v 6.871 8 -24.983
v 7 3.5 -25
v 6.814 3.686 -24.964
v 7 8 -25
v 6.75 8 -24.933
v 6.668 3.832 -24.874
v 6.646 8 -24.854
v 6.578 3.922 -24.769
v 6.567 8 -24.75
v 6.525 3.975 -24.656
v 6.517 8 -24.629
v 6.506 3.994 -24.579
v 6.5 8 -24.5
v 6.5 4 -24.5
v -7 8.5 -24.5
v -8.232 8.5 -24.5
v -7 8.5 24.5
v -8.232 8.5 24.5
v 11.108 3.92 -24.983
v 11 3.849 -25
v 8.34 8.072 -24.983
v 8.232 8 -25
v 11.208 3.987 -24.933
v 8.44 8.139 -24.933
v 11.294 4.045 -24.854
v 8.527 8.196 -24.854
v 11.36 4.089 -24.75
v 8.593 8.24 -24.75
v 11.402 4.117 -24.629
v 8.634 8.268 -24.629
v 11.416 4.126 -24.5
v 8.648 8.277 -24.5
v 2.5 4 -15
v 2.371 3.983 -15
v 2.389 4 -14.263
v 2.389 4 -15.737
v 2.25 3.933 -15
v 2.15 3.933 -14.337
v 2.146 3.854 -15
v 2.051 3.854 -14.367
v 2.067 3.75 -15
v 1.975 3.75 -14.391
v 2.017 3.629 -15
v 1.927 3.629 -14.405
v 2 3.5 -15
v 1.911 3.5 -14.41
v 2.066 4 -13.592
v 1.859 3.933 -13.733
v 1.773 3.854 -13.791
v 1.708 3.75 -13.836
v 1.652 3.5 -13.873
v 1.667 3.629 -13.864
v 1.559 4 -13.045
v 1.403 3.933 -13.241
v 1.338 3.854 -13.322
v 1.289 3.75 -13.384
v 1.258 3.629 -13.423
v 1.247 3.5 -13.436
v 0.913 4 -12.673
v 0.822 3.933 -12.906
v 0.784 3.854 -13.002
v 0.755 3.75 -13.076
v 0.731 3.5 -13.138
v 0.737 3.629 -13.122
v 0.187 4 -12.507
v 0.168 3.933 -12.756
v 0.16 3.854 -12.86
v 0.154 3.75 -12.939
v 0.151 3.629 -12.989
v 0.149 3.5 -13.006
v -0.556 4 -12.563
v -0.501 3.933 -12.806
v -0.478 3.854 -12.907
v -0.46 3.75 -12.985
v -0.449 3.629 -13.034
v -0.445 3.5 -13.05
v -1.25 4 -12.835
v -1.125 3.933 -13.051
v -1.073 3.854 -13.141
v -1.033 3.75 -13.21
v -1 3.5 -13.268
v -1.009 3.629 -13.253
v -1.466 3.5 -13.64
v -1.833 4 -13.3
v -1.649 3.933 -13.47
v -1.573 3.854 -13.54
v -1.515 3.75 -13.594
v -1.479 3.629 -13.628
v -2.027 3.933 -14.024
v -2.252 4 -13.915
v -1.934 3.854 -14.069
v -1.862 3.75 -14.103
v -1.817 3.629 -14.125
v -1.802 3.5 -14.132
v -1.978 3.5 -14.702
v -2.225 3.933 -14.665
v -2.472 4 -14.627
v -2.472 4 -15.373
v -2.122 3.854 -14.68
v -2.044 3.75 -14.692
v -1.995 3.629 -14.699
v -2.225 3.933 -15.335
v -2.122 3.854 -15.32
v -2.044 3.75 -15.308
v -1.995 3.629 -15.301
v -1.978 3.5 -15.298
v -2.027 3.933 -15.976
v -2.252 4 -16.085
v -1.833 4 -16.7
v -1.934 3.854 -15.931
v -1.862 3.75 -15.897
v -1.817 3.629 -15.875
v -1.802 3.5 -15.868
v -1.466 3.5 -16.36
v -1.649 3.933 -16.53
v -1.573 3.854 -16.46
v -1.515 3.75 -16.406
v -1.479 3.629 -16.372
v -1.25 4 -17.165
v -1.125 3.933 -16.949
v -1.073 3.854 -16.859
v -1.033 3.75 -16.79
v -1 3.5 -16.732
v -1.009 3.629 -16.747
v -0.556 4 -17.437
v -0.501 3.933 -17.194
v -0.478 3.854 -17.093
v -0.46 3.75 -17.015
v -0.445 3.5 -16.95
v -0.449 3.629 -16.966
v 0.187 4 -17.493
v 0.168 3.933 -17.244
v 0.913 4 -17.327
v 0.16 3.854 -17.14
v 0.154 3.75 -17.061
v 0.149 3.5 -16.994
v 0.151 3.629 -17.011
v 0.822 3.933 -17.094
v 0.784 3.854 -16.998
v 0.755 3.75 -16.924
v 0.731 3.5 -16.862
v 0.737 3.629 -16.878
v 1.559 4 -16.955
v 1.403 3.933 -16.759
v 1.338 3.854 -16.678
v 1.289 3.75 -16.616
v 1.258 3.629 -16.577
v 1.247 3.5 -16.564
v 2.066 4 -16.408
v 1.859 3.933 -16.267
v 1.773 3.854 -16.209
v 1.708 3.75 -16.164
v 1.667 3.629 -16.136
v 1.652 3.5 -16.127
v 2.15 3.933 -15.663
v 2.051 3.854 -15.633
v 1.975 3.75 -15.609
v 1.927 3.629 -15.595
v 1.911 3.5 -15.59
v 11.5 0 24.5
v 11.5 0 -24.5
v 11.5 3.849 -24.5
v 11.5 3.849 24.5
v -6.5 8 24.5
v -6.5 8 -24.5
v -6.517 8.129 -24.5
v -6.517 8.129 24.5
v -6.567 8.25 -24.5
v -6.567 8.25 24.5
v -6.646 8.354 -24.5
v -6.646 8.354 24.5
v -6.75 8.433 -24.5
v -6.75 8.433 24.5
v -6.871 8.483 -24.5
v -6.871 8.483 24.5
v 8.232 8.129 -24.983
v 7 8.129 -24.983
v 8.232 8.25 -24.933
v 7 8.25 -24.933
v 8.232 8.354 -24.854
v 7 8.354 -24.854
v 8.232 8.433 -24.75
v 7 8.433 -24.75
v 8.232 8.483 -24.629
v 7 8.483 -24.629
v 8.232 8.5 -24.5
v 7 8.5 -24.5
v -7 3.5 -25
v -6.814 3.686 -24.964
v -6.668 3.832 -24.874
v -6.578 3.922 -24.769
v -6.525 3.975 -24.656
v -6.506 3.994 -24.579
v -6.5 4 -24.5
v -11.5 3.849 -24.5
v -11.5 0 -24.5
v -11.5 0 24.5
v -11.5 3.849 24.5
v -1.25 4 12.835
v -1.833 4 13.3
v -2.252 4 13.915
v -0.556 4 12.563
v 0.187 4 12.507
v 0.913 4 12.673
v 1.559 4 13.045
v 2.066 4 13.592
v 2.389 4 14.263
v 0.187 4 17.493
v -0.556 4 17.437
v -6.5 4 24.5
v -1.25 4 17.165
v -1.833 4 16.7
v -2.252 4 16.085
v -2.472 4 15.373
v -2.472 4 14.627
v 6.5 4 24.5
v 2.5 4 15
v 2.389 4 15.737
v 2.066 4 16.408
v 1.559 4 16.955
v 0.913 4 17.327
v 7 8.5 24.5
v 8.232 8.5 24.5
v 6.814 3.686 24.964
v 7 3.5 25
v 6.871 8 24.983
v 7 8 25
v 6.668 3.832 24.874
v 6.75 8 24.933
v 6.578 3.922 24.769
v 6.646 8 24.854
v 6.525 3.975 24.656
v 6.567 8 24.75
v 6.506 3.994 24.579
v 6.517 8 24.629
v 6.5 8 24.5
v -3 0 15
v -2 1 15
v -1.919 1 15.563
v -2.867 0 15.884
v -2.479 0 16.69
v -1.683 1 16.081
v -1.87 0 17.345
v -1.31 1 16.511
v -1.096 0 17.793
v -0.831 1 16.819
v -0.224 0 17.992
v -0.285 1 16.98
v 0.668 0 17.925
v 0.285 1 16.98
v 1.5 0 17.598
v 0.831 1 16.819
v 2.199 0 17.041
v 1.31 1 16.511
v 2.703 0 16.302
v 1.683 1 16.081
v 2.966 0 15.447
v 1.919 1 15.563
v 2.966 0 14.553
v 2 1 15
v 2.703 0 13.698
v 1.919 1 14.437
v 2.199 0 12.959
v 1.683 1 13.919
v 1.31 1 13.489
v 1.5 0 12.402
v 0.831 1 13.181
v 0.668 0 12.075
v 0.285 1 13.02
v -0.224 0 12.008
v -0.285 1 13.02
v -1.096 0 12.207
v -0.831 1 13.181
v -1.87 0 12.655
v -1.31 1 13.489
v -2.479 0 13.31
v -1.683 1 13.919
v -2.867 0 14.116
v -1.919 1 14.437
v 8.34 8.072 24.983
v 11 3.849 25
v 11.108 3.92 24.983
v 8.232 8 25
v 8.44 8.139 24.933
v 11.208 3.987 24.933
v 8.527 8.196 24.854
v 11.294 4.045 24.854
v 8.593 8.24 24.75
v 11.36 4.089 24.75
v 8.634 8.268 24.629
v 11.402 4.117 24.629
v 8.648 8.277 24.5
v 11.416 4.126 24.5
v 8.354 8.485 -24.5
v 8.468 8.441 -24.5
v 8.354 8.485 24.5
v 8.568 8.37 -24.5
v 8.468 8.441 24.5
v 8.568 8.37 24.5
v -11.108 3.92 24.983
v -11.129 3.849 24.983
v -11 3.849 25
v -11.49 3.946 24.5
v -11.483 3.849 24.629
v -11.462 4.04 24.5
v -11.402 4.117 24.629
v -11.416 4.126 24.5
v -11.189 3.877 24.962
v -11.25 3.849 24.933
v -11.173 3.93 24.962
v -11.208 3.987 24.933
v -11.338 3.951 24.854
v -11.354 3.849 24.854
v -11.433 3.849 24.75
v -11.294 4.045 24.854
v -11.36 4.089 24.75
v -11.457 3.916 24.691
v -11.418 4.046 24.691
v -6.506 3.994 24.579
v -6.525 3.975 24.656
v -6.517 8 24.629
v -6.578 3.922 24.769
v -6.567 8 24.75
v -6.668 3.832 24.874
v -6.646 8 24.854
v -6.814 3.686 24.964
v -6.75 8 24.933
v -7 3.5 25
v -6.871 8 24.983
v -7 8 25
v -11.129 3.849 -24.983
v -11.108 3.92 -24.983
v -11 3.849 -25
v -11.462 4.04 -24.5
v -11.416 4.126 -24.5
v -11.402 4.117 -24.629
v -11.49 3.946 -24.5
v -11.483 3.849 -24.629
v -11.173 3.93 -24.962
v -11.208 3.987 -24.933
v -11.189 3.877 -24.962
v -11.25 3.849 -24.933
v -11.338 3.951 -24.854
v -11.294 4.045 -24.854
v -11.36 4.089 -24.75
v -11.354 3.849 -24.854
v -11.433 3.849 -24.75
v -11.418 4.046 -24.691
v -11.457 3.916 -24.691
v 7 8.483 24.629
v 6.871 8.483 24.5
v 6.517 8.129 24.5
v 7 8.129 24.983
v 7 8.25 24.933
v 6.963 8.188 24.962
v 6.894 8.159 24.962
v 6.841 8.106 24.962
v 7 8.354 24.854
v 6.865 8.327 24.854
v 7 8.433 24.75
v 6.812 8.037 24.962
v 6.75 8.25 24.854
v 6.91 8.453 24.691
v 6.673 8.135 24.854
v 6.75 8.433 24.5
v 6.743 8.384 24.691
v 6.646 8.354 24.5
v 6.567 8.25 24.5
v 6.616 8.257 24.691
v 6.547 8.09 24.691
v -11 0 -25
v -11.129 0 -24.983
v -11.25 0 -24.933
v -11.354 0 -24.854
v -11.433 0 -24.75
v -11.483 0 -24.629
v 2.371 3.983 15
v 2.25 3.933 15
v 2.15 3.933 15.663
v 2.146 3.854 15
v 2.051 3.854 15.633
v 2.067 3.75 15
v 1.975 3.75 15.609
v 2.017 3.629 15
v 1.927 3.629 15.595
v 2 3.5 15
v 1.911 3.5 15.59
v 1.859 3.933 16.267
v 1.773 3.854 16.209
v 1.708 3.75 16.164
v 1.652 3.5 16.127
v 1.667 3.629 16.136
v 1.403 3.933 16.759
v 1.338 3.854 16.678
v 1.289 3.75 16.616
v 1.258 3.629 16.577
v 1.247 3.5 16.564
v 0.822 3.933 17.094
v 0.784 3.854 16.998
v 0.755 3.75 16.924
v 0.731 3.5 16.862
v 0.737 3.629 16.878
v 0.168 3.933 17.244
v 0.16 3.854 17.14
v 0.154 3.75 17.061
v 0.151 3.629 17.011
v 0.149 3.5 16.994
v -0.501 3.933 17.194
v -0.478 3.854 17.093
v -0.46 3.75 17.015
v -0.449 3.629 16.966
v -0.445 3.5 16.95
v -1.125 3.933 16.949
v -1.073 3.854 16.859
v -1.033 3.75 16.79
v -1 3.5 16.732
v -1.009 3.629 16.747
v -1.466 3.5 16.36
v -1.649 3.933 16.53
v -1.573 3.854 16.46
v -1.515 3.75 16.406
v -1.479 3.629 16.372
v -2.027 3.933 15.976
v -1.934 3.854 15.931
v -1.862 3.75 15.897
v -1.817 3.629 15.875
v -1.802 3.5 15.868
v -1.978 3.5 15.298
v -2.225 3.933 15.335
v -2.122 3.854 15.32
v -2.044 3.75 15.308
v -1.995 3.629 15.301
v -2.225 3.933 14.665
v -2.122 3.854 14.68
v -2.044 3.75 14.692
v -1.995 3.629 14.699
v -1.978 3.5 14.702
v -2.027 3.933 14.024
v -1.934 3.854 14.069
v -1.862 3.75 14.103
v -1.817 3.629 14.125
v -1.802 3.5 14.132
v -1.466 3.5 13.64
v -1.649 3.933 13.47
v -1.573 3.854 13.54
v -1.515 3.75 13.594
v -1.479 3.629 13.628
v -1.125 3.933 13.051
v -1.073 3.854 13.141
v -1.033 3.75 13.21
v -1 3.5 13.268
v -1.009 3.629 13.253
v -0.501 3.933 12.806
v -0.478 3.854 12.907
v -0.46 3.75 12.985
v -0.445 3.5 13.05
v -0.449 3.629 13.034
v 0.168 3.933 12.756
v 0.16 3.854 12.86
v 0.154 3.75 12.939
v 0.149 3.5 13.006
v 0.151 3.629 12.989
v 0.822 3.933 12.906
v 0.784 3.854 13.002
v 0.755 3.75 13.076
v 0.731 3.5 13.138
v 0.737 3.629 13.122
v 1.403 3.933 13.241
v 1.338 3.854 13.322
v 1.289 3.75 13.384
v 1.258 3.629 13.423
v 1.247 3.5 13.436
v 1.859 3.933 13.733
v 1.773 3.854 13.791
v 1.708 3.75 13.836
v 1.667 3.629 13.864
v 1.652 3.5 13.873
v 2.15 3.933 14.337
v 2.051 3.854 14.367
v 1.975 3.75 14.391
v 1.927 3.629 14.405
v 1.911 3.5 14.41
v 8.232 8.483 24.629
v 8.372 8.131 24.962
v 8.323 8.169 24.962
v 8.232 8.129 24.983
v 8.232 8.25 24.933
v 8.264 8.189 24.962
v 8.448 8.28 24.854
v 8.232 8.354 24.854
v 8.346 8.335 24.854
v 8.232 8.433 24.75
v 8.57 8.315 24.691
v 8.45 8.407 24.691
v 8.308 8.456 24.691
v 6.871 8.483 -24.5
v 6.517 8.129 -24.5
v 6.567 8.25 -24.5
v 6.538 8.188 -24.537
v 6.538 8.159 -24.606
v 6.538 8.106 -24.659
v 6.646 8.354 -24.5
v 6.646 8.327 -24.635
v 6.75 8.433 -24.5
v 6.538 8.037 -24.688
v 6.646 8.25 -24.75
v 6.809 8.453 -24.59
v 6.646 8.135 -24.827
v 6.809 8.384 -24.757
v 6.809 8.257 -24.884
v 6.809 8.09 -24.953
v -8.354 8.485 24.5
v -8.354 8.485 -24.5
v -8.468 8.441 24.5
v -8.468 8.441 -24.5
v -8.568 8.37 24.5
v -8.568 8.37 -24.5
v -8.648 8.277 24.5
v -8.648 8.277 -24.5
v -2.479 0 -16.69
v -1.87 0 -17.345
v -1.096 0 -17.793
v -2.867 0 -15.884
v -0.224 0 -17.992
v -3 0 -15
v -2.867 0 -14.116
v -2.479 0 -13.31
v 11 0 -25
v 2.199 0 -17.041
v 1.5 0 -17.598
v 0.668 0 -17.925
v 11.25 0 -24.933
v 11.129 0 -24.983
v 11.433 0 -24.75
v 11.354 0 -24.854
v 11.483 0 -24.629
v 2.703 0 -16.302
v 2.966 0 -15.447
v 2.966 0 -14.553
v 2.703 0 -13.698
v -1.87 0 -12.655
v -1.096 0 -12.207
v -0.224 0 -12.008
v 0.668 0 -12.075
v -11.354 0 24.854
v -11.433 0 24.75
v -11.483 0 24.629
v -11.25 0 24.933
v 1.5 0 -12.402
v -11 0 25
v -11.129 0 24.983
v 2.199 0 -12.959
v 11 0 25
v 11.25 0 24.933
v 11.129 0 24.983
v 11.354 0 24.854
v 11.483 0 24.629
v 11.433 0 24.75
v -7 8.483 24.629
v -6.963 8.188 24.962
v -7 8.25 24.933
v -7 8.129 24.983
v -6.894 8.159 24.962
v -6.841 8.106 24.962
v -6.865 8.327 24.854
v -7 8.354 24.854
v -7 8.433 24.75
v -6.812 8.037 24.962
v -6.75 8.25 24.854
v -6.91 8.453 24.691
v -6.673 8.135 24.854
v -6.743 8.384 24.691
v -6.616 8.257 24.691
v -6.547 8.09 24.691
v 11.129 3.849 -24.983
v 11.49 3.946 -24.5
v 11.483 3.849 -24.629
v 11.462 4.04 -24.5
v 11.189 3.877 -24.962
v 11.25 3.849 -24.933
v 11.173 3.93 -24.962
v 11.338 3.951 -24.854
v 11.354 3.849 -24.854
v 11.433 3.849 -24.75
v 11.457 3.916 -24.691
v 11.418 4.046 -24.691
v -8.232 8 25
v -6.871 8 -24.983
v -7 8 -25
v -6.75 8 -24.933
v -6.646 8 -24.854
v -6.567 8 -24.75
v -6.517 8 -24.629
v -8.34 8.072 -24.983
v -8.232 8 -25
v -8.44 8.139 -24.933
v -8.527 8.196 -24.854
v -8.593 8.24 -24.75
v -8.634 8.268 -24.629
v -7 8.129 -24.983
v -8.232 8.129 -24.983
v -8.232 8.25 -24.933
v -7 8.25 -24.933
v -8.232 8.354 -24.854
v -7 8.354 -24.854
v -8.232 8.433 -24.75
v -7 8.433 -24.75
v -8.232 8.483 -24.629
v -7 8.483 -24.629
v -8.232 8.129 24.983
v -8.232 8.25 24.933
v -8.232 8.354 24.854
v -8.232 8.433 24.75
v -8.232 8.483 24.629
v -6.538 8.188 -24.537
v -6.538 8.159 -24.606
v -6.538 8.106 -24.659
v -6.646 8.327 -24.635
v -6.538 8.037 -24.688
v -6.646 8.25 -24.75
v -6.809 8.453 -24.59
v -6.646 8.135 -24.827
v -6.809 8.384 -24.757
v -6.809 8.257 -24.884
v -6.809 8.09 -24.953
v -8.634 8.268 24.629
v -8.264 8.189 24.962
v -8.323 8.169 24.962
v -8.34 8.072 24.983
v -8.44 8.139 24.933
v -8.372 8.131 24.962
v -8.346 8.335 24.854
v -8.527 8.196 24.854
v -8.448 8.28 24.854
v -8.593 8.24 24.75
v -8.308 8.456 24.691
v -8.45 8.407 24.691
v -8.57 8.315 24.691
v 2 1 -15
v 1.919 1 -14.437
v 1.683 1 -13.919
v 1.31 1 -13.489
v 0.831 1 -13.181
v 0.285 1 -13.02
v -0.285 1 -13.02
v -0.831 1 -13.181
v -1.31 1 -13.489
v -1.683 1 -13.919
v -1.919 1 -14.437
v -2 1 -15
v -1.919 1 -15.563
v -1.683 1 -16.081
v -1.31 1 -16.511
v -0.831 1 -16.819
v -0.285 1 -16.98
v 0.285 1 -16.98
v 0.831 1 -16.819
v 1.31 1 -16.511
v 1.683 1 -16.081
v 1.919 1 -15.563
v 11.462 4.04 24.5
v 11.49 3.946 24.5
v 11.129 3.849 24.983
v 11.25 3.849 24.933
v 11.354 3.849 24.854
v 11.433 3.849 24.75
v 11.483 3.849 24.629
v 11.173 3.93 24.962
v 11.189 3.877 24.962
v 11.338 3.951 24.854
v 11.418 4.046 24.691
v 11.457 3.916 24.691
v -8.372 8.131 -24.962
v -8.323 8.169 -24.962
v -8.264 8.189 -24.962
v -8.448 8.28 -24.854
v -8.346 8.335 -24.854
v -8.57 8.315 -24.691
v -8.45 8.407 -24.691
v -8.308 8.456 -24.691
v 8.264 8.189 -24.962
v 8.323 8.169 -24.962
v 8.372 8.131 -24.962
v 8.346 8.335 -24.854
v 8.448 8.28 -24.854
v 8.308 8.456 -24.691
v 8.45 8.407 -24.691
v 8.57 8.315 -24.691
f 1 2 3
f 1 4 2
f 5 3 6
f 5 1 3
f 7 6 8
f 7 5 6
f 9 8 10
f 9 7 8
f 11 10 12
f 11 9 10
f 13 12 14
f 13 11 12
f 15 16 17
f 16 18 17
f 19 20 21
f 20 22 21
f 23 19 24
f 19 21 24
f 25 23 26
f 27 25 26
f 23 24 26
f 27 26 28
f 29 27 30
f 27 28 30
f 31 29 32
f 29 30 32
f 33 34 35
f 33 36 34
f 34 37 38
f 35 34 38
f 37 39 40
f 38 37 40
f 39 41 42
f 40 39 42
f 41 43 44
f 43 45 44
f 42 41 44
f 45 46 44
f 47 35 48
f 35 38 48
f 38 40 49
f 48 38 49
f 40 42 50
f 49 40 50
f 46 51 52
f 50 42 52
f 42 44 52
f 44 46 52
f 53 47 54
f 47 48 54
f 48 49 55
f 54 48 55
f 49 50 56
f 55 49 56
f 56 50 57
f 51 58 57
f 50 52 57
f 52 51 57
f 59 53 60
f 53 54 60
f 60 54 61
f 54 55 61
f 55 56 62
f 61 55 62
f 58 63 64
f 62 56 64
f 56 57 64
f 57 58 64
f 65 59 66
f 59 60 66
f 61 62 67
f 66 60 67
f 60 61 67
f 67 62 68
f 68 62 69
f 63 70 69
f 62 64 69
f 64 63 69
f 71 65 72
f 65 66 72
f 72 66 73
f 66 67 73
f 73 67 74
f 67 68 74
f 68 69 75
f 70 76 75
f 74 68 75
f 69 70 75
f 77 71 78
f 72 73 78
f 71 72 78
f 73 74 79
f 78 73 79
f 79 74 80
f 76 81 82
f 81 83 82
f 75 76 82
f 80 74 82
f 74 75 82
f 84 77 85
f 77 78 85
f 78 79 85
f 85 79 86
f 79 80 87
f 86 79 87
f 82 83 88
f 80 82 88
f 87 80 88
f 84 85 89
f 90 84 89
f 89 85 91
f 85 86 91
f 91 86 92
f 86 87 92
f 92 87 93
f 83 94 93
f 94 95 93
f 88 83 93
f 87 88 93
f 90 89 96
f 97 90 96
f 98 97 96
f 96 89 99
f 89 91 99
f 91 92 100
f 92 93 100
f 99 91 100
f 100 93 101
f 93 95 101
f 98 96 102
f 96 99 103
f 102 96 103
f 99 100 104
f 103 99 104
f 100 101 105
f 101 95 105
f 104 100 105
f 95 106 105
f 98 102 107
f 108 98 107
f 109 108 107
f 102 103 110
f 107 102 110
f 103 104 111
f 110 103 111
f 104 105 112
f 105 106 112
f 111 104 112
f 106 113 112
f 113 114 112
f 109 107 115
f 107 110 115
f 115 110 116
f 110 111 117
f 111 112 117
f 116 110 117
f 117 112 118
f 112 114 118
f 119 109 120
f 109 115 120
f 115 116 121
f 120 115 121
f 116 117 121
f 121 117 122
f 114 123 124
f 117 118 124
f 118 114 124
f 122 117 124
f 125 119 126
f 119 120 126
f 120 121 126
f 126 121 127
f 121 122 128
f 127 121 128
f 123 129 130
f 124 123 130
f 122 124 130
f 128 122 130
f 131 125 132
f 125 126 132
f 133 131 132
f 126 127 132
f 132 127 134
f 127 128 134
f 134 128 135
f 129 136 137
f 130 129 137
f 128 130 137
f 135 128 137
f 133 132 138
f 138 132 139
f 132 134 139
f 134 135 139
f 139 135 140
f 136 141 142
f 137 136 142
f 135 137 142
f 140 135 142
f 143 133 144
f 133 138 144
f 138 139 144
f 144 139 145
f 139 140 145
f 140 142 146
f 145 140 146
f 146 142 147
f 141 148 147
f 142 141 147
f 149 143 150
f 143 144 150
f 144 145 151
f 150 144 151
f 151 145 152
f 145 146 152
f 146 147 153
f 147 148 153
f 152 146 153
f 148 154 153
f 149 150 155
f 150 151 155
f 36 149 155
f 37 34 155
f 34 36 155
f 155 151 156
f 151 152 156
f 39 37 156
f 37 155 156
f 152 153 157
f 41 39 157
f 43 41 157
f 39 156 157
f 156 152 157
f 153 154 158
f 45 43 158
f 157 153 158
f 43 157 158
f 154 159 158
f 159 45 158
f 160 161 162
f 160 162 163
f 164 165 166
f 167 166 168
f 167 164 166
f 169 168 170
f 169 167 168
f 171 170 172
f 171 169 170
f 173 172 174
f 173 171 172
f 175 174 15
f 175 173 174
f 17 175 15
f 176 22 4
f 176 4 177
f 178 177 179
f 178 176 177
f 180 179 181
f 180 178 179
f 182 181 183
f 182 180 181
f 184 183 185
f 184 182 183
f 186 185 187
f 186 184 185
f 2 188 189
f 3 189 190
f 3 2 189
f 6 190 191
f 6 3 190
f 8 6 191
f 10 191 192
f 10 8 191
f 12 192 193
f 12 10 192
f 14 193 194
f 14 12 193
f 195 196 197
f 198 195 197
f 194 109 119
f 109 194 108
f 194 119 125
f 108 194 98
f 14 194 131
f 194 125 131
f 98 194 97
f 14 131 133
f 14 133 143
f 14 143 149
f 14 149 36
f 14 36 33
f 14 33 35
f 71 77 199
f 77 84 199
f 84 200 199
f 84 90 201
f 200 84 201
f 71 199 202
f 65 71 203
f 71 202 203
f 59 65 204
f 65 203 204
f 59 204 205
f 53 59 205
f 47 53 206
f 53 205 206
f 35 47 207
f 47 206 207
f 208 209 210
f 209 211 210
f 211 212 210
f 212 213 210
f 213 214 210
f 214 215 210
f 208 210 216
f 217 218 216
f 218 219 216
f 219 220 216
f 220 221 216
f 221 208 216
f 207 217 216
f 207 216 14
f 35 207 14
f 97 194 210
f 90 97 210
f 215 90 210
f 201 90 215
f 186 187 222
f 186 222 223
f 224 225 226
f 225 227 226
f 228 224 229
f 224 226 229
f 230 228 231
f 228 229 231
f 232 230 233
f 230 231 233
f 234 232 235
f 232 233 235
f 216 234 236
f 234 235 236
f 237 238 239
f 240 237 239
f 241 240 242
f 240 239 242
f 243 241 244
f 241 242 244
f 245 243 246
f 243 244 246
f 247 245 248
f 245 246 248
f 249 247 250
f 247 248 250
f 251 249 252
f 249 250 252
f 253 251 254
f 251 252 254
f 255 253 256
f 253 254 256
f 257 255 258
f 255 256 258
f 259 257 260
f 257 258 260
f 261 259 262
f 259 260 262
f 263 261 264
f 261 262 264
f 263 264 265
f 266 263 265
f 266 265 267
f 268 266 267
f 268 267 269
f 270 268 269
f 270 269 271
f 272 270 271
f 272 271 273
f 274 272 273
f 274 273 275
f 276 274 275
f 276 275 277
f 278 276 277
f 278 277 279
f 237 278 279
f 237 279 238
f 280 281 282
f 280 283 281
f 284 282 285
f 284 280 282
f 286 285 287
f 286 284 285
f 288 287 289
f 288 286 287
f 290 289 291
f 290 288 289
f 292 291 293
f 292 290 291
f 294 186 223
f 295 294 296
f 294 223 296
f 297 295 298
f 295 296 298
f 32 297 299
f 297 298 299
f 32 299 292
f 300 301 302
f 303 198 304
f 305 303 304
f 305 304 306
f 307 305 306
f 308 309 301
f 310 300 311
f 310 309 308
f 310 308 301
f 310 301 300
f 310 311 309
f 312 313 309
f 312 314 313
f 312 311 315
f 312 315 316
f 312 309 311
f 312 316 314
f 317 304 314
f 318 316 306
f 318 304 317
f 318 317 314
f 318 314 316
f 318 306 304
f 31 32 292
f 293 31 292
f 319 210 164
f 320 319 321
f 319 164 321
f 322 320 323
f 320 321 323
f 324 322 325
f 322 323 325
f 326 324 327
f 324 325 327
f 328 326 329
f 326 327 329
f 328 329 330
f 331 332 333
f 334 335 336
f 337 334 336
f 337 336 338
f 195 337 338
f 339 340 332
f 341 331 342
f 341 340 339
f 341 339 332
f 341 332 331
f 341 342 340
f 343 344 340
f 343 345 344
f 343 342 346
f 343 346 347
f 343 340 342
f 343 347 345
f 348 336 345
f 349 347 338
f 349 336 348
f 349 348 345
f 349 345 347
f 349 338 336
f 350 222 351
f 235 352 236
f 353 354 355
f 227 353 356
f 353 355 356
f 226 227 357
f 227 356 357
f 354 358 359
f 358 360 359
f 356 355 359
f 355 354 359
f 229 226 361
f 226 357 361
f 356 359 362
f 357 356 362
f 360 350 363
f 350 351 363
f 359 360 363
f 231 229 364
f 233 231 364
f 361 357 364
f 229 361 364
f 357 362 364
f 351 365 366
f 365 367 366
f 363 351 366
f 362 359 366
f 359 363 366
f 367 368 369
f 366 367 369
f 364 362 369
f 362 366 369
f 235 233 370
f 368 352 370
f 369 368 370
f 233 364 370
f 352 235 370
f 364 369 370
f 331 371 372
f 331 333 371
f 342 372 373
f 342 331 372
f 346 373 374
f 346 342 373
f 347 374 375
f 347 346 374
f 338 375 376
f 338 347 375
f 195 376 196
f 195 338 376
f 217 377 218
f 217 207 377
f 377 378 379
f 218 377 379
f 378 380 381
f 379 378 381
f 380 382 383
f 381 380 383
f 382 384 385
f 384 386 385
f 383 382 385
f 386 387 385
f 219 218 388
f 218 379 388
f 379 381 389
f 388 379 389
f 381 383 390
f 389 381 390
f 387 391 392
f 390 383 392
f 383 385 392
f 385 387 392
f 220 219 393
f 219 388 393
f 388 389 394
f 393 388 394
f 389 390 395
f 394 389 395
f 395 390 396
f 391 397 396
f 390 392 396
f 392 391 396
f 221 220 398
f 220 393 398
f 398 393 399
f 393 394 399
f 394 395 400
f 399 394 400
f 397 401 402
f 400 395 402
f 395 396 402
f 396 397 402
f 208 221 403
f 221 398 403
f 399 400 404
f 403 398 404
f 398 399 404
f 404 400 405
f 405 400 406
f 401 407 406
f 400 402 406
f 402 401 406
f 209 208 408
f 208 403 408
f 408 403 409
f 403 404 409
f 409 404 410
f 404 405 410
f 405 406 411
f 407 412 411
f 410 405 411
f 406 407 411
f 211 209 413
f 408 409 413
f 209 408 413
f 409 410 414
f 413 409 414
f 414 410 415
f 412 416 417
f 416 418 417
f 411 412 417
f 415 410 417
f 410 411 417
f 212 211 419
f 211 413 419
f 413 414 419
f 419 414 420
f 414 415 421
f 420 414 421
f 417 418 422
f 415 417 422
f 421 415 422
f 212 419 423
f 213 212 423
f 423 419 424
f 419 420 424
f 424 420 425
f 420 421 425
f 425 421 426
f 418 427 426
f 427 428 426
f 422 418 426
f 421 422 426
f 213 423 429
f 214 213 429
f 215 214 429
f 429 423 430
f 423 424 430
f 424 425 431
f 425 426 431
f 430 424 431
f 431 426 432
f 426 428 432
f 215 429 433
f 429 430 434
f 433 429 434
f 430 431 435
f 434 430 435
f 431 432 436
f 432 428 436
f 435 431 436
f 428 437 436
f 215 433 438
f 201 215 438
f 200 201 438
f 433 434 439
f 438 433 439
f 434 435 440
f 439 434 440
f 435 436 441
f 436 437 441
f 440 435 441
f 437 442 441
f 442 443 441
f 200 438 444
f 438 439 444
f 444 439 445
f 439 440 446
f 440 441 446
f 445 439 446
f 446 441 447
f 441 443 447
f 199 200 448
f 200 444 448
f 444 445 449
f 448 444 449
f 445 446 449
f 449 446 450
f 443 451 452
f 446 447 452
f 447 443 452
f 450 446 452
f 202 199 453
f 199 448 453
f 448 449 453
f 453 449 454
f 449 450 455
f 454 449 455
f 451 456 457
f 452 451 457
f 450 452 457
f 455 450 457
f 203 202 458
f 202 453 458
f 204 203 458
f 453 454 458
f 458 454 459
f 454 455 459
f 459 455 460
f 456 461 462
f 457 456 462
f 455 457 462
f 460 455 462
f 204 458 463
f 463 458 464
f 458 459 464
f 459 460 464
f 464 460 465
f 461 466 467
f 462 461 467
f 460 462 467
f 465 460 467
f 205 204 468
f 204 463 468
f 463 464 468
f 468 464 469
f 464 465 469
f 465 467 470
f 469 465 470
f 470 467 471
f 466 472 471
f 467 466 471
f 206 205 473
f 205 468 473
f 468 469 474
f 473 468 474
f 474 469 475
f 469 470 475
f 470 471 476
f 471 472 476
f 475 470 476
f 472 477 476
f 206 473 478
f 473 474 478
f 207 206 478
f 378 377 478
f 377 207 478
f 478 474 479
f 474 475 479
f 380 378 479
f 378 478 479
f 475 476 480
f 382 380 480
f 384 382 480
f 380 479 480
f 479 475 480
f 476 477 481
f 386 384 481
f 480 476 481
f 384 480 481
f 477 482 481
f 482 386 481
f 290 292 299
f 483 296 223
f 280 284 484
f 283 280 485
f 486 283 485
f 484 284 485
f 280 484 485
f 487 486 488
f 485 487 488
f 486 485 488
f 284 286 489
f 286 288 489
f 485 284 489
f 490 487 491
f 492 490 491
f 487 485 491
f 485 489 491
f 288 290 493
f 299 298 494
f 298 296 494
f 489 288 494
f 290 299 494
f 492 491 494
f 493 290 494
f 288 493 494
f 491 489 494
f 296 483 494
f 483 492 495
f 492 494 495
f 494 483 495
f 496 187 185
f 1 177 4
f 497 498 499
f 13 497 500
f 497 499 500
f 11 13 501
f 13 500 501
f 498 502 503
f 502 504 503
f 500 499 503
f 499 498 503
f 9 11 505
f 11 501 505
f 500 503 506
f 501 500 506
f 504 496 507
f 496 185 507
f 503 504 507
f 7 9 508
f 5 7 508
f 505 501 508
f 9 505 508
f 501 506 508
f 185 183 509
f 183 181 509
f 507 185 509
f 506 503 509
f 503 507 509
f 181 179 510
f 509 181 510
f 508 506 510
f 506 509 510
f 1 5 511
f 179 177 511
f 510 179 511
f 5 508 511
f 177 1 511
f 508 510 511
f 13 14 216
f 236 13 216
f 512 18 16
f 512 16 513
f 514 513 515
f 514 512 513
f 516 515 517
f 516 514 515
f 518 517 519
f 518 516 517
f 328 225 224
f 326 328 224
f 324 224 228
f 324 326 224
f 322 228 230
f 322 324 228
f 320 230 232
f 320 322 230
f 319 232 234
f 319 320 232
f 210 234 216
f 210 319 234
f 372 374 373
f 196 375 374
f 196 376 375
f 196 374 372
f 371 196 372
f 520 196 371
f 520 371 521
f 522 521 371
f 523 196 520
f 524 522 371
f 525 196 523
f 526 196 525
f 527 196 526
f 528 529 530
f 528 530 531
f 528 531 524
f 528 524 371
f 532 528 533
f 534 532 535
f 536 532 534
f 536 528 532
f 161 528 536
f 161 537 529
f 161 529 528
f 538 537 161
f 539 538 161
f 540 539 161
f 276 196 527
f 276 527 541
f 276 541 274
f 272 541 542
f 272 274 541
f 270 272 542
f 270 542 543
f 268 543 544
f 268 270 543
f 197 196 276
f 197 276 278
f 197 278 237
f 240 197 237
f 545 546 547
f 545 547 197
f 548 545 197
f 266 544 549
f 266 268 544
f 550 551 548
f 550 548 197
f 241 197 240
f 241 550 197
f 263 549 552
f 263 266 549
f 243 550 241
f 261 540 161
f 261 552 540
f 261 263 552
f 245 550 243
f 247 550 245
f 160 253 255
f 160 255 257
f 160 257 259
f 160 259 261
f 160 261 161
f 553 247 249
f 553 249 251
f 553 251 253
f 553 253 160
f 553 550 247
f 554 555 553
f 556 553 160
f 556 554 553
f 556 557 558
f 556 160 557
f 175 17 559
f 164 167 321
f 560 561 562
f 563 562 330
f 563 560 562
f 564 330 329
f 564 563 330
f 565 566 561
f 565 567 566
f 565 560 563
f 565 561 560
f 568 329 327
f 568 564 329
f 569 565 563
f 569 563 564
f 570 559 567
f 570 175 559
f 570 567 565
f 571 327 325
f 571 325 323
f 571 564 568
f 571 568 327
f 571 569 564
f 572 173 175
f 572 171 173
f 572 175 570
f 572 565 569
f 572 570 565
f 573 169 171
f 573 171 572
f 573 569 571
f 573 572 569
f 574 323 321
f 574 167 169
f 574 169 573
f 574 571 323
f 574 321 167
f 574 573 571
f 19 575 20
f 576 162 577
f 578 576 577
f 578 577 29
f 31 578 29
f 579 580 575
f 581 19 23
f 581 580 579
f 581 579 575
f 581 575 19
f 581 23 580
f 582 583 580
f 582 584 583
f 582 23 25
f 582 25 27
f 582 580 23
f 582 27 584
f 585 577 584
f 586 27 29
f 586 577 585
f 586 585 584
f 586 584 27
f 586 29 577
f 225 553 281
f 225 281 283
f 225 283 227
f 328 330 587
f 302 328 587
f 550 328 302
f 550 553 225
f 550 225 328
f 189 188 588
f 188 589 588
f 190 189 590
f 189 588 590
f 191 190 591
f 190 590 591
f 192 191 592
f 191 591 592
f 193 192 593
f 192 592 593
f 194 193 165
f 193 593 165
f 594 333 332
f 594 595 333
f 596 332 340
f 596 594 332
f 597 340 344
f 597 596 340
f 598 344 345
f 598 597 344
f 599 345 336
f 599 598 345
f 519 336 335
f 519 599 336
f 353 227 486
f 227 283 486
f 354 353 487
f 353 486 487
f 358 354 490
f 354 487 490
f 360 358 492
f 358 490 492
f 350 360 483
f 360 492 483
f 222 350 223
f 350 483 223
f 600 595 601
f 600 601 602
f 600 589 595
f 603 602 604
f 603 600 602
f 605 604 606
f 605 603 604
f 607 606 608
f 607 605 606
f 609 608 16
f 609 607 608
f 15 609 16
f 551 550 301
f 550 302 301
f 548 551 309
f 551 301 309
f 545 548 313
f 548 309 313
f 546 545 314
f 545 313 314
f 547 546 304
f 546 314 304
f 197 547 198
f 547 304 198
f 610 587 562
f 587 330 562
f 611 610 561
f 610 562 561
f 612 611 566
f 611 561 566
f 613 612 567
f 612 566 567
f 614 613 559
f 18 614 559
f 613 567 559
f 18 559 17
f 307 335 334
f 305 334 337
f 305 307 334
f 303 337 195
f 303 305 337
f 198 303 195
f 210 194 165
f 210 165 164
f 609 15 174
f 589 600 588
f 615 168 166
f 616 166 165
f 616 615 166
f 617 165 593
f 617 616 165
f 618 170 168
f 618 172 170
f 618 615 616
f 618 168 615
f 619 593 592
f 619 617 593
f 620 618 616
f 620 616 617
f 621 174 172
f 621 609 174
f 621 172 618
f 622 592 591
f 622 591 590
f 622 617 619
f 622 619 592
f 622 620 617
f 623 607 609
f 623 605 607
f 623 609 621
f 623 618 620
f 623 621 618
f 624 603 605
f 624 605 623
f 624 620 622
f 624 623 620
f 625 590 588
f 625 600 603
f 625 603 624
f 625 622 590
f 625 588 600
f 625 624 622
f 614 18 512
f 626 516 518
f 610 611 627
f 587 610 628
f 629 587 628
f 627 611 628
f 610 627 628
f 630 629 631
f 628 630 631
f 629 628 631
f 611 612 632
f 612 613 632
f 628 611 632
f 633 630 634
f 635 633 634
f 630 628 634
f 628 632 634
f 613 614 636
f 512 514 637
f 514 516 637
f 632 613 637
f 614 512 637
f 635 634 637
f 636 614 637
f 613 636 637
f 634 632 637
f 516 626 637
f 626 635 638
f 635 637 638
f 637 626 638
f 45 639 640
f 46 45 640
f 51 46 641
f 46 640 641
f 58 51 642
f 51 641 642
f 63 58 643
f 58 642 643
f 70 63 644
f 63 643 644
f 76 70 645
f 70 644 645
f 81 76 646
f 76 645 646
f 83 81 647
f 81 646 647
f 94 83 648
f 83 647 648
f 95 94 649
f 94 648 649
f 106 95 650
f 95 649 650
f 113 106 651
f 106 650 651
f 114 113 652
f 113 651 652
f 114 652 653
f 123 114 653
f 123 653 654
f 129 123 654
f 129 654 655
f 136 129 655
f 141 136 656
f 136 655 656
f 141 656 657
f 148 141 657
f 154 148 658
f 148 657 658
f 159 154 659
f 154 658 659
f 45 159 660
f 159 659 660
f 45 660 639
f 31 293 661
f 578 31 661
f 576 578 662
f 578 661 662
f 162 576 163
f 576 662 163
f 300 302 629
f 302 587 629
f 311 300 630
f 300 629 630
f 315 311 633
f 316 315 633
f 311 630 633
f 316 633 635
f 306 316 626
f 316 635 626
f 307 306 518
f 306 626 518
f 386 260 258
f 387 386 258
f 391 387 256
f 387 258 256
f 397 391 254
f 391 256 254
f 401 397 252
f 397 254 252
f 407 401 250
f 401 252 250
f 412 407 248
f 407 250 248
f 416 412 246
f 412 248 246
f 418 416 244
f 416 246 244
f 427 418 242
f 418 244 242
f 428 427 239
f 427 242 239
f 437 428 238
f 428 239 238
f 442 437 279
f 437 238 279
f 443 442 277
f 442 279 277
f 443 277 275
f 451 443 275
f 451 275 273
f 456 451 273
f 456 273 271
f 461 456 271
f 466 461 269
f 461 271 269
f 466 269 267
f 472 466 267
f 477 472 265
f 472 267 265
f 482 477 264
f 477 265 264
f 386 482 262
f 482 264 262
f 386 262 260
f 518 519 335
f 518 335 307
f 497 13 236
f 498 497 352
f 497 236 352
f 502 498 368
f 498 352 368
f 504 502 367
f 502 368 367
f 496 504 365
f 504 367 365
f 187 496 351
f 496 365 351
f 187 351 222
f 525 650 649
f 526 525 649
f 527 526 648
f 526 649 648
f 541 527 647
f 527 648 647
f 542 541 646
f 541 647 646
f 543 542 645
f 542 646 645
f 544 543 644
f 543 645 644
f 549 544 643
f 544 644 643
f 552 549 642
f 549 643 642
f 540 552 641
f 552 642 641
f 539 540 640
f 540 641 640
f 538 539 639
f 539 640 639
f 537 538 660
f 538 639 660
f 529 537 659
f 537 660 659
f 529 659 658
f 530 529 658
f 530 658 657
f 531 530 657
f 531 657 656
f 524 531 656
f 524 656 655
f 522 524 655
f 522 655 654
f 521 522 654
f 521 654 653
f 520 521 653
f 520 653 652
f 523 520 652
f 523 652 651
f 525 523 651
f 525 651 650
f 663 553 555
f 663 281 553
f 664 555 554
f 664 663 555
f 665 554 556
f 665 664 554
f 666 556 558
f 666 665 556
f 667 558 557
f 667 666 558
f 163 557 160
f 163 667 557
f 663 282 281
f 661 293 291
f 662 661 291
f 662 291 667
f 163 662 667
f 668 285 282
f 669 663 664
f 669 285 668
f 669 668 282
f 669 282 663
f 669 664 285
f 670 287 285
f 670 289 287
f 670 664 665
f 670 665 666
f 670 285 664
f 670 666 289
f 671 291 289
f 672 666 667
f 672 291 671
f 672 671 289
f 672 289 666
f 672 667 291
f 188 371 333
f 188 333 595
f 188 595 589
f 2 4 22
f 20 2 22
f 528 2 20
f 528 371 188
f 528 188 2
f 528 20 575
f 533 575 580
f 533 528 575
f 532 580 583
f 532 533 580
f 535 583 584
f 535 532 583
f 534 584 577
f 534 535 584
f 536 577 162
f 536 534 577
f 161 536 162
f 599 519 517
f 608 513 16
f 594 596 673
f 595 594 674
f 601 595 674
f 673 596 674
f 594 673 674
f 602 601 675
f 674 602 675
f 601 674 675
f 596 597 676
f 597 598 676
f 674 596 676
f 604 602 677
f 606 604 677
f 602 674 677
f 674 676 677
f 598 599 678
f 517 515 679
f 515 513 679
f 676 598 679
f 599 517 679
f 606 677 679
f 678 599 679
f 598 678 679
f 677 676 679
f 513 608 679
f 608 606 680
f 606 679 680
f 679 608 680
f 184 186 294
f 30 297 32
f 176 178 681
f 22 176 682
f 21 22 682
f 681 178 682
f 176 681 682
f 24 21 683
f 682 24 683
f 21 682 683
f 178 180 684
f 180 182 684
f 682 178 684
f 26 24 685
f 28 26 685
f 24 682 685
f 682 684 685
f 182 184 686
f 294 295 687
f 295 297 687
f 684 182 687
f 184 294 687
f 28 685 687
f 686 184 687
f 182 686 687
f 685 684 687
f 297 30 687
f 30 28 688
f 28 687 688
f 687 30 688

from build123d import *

# Parameters (mm, degrees)
F0_W           = 12
F0_H           = 50
F0_R           = 2
F0_W_2         = 0.5
F0_W_3         = 5
F1_DEPTH       = 4
F2_DEPTH       = 8.5
F3_SIZE2       = 3
F3_SIZE        = 4.5
F4_SIZE2       = 3
F4_SIZE        = 4.5
F5_D           = 4
F5_CSINK_D     = 6
F5_CSINK_ANGLE = 90
F6_R           = 0.5


with BuildPart() as f1:
    # F0 (on Front) → F1 (new body)
    with BuildSketch(Plane.XZ):
        Rectangle(F0_W, F0_H)
        with Locations((0, -15)):
            Circle(F0_R, mode=Mode.SUBTRACT)
        with Locations((0, 15)):
            Circle(F0_R, mode=Mode.SUBTRACT)
        with Locations((6.25, 0)):
            Rectangle(F0_W_2, F0_H)
        with Locations((-6.25, 0)):
            Rectangle(F0_W_2, F0_H)
        with Locations((9, 0)):
            Rectangle(F0_W_3, F0_H)
        with Locations((-9, 0)):
            Rectangle(F0_W_3, F0_H)
    extrude(amount=-F1_DEPTH)

    # F0 (on Front) → F2 (join)
    with BuildSketch(Plane.XZ):
        with Locations((-9, 0)):
            Rectangle(F0_W_3, F0_H)
        with Locations((9, 0)):
            Rectangle(F0_W_3, F0_H)
    extrude(amount=-F2_DEPTH)

    # F3
    f3_edges = [f1.edges().sort_by_distance(p)[0] for p in [
        (-11.5, 8.5, 0),
    ]]
    f3_side = f1.faces().sort_by_distance((-11.5, 4.25, 0))[0]
    chamfer(f3_edges, length=F3_SIZE, length2=F3_SIZE2, reference=f3_side)

    # F4
    f4_edges = [f1.edges().sort_by_distance(p)[0] for p in [
        (11.5, 8.5, 0),
    ]]
    f4_side = f1.faces().sort_by_distance((11.5, 4.25, 0))[0]
    chamfer(f4_edges, length=F4_SIZE, length2=F4_SIZE2, reference=f4_side)

    # F5 (through all)
    with Locations(Plane.XZ):
        with Locations((0, 15), (0, -15)):
            CounterSinkHole(F5_D / 2, F5_CSINK_D / 2, counter_sink_angle=F5_CSINK_ANGLE)

    # F6
    f6_edges = [f1.edges().sort_by_distance(p)[0] for p in [
        (10, 6.25, -25),
        (11.5, 4, 0),
        (8.5, 8.5, 0),
        (10, 6.25, 25),
        (7.5, 8.5, -25),
        (6.5, 8.5, 0),
        (7.5, 8.5, 25),
        (-7.5, 8.5, -25),
        (-8.5, 8.5, 0),
        (-6.5, 8.5, 0),
        (-7.5, 8.5, 25),
        (-10, 6.25, 25),
        (-11.5, 4, 0),
        (-10, 6.25, -25),
        (-2, 4, -15),
        (-2, 4, 15),
        (0, 4, -25),
        (6.5, 6.25, -25),
        (-6.5, 6.25, -25),
        (-11.5, 2, -25),
        (11.5, 2, -25),
        (11.5, 2, 25),
        (6.5, 6.25, 25),
        (0, 4, 25),
        (-6.5, 6.25, 25),
        (-11.5, 2, 25),
    ]]
    fillet(f6_edges, radius=F6_R)


solid = f1.part
